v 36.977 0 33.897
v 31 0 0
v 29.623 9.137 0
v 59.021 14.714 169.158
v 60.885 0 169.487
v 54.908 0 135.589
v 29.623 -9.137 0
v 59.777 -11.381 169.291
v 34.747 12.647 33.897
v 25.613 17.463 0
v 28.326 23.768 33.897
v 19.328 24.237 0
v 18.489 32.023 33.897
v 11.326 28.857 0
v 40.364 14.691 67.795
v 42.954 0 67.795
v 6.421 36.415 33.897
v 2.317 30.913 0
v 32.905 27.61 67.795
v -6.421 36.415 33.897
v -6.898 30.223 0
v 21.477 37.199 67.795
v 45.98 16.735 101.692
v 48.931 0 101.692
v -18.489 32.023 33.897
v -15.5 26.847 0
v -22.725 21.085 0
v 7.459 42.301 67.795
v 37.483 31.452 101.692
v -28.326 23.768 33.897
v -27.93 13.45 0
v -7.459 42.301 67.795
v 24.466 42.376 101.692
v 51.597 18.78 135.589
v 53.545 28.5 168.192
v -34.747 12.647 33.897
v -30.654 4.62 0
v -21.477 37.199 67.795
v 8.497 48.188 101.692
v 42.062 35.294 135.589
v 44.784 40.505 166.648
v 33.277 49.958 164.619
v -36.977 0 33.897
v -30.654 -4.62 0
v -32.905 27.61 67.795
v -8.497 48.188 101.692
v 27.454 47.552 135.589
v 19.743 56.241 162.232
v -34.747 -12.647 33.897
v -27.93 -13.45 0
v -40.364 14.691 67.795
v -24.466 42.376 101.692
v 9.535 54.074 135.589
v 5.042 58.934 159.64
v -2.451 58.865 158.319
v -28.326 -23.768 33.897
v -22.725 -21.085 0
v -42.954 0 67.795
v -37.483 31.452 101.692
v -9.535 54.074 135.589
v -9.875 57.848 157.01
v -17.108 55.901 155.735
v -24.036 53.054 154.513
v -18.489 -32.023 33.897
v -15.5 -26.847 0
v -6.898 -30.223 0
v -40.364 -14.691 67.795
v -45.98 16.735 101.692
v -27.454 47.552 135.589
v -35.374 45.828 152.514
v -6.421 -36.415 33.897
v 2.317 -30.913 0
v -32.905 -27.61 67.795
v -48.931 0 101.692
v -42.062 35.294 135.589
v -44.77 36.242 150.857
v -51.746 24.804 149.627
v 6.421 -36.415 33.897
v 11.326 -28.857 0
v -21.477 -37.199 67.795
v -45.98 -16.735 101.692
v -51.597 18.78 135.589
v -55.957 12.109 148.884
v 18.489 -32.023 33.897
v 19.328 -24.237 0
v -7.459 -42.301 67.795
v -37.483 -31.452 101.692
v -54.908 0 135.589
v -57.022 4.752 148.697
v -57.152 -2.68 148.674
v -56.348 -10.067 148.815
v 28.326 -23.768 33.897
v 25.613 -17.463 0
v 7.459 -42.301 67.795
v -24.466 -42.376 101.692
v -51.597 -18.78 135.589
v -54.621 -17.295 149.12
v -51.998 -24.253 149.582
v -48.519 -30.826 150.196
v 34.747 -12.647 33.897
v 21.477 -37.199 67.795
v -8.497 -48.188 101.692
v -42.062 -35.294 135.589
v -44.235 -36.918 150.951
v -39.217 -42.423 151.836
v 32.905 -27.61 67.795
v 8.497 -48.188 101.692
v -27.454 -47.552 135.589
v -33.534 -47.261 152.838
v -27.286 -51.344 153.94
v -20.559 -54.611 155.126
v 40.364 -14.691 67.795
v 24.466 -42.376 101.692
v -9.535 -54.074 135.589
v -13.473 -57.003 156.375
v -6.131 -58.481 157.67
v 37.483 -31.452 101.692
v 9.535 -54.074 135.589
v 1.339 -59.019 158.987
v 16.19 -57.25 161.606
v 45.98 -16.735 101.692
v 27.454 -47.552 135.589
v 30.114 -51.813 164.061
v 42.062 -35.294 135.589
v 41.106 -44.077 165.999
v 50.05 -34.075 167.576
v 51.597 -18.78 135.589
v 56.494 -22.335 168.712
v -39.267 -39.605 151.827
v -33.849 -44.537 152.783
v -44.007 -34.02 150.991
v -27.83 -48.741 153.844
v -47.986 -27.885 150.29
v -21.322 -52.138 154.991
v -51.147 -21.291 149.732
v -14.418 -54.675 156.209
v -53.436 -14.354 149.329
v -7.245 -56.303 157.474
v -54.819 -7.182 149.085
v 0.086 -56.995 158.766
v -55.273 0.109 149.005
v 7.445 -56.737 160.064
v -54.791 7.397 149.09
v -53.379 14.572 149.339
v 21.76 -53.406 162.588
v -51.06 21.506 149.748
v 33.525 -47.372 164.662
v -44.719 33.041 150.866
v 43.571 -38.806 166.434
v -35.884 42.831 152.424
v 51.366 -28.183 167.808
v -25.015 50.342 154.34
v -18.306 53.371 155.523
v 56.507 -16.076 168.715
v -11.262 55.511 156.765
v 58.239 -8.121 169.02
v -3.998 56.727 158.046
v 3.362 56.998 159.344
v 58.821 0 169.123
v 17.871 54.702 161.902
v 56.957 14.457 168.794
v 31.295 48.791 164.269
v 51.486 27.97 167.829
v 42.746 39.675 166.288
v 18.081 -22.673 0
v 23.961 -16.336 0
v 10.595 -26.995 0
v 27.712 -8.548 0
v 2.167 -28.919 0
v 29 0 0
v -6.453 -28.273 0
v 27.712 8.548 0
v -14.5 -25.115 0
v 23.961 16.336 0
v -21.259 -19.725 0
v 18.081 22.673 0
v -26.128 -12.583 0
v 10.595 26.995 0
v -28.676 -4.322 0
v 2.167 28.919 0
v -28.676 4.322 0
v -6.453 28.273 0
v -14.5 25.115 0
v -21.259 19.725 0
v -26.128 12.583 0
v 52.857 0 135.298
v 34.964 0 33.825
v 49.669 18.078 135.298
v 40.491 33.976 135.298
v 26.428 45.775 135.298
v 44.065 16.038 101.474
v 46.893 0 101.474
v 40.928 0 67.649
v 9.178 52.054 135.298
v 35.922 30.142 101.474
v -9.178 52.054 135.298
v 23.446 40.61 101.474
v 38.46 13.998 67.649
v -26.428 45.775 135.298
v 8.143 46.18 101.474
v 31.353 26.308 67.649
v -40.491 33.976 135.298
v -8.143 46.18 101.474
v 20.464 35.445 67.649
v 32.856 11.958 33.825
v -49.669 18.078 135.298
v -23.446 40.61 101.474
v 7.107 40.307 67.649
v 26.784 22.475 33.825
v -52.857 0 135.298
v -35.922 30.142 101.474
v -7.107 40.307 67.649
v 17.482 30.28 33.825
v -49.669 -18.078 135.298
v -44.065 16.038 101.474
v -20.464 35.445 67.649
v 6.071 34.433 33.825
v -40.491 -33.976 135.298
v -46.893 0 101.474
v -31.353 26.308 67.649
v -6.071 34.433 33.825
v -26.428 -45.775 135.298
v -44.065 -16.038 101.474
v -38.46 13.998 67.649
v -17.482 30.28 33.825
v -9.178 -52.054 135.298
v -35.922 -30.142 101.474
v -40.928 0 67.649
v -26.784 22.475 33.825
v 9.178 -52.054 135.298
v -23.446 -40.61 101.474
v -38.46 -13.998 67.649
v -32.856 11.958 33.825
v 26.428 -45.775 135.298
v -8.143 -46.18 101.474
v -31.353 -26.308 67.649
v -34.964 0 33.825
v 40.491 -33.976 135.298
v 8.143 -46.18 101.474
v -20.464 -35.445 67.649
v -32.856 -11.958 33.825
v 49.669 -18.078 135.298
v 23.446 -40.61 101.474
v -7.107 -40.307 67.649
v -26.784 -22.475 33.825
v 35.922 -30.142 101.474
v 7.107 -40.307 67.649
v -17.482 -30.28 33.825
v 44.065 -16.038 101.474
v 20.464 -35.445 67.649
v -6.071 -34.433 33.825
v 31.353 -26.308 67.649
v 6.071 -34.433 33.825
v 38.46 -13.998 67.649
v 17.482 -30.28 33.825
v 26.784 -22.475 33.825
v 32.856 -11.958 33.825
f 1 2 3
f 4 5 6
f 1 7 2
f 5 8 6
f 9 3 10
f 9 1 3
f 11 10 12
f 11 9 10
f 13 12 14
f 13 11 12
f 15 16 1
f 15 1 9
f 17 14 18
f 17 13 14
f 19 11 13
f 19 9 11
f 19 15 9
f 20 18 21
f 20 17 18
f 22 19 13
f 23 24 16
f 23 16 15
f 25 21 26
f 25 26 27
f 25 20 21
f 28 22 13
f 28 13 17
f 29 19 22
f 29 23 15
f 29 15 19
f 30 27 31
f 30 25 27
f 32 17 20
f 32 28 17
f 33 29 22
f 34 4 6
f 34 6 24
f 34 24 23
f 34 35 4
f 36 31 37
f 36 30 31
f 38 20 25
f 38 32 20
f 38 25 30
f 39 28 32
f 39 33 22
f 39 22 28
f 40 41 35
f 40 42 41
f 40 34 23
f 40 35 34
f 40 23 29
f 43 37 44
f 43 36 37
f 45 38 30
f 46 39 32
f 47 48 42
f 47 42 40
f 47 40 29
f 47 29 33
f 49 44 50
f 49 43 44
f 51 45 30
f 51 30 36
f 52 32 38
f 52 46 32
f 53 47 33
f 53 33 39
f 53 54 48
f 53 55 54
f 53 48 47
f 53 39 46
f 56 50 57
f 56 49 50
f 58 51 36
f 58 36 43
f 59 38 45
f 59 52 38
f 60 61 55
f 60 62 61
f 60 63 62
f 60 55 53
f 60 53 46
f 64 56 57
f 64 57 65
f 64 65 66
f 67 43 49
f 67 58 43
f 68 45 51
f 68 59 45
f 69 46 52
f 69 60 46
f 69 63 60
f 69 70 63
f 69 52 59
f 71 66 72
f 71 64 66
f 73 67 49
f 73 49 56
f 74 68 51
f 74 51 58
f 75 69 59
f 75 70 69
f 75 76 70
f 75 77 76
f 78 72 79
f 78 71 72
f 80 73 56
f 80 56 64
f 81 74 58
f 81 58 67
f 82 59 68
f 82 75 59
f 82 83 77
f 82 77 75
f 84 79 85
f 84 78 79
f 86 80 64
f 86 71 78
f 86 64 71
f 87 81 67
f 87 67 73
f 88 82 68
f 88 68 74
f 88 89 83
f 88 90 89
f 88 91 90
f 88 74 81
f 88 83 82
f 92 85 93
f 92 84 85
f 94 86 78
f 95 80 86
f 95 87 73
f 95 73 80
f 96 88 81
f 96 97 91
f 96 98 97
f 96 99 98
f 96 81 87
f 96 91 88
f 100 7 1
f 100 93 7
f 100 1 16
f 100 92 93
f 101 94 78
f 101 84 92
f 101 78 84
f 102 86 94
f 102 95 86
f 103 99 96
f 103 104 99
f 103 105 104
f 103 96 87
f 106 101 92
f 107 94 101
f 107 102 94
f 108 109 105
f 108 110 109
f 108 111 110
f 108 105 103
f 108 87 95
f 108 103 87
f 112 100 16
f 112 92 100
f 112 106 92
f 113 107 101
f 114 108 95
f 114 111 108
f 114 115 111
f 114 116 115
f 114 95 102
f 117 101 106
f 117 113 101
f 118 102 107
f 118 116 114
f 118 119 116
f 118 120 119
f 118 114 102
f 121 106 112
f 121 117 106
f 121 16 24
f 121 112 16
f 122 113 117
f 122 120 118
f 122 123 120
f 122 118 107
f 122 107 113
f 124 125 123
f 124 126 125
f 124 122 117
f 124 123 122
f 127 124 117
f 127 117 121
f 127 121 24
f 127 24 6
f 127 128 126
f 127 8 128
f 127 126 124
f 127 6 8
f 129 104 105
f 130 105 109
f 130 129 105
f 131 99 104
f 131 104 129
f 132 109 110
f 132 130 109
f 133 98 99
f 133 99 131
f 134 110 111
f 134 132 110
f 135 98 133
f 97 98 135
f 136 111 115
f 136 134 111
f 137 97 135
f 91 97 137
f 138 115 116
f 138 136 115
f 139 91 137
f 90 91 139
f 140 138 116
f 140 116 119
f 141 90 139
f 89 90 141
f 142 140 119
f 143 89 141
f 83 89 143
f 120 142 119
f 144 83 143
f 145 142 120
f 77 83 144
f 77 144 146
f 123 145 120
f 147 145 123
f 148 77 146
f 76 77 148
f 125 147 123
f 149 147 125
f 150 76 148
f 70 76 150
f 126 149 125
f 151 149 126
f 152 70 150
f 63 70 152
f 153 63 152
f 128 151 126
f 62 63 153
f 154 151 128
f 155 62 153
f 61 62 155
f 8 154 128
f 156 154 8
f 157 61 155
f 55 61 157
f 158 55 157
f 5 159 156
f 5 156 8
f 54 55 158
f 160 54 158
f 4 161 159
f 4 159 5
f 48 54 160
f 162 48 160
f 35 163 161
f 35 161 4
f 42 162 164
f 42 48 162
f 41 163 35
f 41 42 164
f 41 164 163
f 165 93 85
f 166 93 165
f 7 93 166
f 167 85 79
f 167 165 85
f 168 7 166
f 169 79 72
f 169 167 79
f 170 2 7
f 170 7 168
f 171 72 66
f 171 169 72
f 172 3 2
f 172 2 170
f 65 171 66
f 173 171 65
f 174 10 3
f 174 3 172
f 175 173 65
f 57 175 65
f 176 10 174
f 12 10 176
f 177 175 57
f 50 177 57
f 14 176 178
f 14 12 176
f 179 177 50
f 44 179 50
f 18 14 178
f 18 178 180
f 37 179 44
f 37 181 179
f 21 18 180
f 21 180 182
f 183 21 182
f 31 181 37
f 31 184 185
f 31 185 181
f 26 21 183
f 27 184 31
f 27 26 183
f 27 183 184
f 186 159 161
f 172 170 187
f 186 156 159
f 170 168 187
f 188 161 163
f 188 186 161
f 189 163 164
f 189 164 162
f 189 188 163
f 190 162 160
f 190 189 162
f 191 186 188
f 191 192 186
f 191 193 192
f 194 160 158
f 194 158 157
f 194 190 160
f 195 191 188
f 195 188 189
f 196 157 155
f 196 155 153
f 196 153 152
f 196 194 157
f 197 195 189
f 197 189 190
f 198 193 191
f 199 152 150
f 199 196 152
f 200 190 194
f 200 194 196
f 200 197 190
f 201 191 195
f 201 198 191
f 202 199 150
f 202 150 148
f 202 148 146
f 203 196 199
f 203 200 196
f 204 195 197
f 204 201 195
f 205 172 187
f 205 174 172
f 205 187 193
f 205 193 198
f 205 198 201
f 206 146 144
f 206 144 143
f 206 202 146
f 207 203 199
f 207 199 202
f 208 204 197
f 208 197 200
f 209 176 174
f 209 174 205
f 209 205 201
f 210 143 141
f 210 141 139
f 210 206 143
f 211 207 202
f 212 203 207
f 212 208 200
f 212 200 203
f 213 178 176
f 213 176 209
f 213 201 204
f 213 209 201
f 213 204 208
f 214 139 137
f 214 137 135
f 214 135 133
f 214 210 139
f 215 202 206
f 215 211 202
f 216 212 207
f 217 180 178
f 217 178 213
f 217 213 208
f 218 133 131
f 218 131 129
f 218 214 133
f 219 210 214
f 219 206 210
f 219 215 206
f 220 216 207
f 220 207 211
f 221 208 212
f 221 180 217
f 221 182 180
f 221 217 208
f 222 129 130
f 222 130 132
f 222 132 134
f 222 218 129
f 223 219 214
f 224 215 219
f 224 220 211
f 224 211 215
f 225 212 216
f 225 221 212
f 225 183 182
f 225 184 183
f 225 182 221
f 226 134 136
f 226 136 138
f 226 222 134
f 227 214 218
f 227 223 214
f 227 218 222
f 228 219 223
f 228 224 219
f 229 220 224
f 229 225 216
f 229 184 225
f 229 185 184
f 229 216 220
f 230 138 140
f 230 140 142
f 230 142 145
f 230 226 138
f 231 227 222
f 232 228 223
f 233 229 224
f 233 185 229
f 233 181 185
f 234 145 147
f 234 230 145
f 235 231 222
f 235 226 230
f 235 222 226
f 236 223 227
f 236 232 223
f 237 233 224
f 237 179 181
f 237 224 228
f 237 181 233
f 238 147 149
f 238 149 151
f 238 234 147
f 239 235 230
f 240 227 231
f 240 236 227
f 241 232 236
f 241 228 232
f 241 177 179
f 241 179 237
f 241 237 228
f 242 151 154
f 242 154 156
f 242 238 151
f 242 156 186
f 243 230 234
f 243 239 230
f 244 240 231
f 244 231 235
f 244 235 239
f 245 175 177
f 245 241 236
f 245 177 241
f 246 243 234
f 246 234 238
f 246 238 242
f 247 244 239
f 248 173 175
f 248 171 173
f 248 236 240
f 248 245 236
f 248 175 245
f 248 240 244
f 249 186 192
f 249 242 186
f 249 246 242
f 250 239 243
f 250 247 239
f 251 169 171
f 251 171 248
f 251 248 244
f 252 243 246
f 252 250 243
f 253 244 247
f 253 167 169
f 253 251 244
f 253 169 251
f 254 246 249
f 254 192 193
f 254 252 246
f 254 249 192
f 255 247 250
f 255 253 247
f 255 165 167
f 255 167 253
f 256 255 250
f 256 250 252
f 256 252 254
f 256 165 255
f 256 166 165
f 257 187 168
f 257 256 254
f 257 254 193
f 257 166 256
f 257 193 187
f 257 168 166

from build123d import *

# Parameters (mm, degrees)
BOX001_W           = 200
BOX001_H           = 199
BOX001_DEPTH       = 200
BOX001_PITCH_ANGLE = -10


with BuildPart() as cube001:
    # Box001 → Box001 (new body)
    with BuildSketch(Plane.XY):
        with Locations((100, 99.5)):
            Rectangle(BOX001_W, BOX001_H)
    extrude(amount=BOX001_DEPTH)


with BuildPart() as cube001_1:
    # Box001 pitch: moved
    add(cube001.part.rotate(Axis((0, 0, 0), (0, 1, 0)), BOX001_PITCH_ANGLE))


with BuildPart() as cube001_2:
    # Box001 placement: moved
    add(cube001_1.part.moved(Location((-95, -94, 142))))


with BuildPart() as center_shade_62mm_base:
    # Sketch001 → Revolution001 (revolve)
    with BuildSketch(Plane.XZ):
        Polygon((31, 0), (60.975587, 170), (58.975587, 170), (29, 0), align=None)
    revolve(axis=Axis((0, 0, 0), (0, 0, 1)))

    # Cut001: cut Cube001
    add(cube001_2.part, mode=Mode.SUBTRACT)


solid = center_shade_62mm_base.part
